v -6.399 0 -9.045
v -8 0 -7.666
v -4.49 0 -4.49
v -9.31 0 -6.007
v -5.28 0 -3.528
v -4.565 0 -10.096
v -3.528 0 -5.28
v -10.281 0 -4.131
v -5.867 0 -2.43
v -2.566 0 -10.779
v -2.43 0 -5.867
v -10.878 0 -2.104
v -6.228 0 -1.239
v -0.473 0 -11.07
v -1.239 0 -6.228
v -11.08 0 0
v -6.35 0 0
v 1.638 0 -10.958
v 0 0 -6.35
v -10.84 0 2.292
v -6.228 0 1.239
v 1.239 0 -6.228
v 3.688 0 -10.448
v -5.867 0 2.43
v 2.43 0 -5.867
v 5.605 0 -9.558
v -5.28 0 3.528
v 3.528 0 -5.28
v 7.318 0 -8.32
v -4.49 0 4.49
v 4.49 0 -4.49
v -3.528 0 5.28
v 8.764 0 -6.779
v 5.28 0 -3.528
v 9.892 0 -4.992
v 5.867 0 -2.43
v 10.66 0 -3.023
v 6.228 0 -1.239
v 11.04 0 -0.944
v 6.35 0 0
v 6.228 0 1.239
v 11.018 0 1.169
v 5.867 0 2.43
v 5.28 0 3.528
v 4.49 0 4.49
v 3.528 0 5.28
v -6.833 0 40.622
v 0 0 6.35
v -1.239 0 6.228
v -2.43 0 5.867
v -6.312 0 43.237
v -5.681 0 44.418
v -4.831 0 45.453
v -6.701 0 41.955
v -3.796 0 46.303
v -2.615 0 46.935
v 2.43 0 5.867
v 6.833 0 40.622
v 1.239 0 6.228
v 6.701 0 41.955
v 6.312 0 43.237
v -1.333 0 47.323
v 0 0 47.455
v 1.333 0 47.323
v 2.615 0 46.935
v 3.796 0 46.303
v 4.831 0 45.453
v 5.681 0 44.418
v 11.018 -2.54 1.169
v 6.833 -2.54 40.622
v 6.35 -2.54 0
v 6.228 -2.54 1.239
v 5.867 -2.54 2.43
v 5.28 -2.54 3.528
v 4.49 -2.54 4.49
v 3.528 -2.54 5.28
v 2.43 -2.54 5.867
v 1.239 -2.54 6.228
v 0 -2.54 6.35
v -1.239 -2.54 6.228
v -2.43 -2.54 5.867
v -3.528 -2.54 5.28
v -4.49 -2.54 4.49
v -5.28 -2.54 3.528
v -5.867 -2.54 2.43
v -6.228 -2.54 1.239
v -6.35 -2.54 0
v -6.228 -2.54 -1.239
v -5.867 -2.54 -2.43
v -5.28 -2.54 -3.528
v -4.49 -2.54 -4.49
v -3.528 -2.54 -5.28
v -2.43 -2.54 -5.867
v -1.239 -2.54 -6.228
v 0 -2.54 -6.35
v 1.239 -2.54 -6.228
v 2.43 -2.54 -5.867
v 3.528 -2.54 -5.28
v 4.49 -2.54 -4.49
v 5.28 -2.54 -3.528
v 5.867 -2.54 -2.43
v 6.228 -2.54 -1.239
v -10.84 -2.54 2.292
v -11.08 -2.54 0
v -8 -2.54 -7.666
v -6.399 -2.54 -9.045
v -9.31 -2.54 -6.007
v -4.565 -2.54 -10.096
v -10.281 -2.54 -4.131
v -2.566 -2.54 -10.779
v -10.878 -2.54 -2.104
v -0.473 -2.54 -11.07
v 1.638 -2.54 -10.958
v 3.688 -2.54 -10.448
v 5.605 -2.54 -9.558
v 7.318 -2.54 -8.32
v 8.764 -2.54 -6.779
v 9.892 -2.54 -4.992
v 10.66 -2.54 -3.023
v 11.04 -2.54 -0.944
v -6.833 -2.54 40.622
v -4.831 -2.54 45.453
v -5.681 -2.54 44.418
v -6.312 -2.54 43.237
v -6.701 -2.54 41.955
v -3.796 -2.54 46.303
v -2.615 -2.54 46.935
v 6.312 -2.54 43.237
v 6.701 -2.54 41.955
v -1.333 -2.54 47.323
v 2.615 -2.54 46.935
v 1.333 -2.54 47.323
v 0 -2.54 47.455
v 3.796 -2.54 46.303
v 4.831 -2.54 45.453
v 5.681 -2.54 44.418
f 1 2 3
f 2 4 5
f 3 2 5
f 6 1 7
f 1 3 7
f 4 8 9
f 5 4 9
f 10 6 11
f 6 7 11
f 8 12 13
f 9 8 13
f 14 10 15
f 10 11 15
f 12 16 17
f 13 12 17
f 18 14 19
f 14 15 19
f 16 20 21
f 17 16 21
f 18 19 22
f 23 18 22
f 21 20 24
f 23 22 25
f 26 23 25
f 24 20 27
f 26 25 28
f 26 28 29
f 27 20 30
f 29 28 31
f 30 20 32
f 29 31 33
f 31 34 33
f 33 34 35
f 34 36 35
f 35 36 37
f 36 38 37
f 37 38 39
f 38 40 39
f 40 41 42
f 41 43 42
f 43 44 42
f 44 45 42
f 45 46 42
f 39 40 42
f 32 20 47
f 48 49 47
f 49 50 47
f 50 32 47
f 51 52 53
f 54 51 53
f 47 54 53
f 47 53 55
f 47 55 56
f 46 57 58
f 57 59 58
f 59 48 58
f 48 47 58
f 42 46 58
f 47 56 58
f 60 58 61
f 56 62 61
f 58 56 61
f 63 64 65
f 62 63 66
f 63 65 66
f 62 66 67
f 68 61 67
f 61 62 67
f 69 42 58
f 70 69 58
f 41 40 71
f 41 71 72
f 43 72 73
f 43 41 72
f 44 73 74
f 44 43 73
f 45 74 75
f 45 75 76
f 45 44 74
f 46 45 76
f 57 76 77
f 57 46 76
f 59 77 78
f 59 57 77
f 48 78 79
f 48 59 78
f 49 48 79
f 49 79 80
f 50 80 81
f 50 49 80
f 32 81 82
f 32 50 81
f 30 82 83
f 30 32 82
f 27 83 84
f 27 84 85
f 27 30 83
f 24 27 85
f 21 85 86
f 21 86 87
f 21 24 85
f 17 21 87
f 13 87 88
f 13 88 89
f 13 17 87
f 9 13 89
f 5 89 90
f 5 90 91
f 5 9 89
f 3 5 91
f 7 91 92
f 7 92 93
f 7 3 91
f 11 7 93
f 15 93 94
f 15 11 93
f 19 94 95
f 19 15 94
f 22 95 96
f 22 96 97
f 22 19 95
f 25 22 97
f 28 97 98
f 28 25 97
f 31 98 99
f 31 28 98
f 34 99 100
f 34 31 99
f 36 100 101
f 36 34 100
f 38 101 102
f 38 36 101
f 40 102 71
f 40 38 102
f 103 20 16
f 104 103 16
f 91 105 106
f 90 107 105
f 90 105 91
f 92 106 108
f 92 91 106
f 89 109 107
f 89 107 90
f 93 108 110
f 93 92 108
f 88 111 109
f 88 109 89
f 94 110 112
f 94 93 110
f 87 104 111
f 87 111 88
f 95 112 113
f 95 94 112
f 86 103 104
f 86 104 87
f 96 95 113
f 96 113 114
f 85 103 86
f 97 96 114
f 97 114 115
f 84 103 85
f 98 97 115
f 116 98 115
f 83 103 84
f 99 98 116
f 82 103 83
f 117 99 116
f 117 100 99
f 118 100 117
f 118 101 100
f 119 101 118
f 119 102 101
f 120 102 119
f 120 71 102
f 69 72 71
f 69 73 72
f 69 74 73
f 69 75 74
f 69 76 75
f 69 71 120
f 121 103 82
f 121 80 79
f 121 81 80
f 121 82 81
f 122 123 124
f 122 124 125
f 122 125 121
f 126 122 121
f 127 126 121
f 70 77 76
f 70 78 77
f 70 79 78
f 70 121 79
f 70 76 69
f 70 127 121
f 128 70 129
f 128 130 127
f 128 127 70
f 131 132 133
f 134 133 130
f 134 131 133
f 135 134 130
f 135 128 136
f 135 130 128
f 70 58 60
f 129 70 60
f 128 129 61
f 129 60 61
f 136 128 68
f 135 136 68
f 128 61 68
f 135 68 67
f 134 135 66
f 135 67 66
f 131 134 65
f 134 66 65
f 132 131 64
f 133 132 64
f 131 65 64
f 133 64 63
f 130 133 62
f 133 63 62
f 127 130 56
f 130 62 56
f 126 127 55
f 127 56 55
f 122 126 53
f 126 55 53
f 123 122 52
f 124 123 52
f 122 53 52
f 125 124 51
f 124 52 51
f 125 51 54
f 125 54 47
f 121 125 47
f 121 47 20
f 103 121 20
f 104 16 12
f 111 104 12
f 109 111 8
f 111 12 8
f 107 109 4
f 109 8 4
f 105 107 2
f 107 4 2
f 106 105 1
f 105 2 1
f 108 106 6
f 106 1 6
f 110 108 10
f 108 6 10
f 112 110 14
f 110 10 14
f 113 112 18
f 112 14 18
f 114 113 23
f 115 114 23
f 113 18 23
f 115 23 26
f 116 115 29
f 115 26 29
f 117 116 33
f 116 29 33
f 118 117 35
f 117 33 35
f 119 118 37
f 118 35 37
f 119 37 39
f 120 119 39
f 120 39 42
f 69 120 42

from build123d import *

# Parameters (mm, degrees)
F0_R     = 6.35
F1_DEPTH = 2.54


with BuildPart() as f1:
    # F0 (on Front) → F1 (new body)
    with BuildSketch(Plane.XZ):
        with BuildLine():
            Line((-6.8326, 40.622082), (-10.840268, 2.291895))
            Line((-10.840268, 2.291895), (-11.0799, 0))
            ThreePointArc((-11.0799, 0), (0.585254, -11.064433), (11.018073, 1.168874))
            Line((11.018073, 1.168874), (6.8326, 40.622082))
            ThreePointArc((6.8326, 40.622082), (0, 47.454682), (-6.8326, 40.622082))
        make_face()
        Circle(F0_R, mode=Mode.SUBTRACT)
    extrude(amount=F1_DEPTH)


solid = f1.part
